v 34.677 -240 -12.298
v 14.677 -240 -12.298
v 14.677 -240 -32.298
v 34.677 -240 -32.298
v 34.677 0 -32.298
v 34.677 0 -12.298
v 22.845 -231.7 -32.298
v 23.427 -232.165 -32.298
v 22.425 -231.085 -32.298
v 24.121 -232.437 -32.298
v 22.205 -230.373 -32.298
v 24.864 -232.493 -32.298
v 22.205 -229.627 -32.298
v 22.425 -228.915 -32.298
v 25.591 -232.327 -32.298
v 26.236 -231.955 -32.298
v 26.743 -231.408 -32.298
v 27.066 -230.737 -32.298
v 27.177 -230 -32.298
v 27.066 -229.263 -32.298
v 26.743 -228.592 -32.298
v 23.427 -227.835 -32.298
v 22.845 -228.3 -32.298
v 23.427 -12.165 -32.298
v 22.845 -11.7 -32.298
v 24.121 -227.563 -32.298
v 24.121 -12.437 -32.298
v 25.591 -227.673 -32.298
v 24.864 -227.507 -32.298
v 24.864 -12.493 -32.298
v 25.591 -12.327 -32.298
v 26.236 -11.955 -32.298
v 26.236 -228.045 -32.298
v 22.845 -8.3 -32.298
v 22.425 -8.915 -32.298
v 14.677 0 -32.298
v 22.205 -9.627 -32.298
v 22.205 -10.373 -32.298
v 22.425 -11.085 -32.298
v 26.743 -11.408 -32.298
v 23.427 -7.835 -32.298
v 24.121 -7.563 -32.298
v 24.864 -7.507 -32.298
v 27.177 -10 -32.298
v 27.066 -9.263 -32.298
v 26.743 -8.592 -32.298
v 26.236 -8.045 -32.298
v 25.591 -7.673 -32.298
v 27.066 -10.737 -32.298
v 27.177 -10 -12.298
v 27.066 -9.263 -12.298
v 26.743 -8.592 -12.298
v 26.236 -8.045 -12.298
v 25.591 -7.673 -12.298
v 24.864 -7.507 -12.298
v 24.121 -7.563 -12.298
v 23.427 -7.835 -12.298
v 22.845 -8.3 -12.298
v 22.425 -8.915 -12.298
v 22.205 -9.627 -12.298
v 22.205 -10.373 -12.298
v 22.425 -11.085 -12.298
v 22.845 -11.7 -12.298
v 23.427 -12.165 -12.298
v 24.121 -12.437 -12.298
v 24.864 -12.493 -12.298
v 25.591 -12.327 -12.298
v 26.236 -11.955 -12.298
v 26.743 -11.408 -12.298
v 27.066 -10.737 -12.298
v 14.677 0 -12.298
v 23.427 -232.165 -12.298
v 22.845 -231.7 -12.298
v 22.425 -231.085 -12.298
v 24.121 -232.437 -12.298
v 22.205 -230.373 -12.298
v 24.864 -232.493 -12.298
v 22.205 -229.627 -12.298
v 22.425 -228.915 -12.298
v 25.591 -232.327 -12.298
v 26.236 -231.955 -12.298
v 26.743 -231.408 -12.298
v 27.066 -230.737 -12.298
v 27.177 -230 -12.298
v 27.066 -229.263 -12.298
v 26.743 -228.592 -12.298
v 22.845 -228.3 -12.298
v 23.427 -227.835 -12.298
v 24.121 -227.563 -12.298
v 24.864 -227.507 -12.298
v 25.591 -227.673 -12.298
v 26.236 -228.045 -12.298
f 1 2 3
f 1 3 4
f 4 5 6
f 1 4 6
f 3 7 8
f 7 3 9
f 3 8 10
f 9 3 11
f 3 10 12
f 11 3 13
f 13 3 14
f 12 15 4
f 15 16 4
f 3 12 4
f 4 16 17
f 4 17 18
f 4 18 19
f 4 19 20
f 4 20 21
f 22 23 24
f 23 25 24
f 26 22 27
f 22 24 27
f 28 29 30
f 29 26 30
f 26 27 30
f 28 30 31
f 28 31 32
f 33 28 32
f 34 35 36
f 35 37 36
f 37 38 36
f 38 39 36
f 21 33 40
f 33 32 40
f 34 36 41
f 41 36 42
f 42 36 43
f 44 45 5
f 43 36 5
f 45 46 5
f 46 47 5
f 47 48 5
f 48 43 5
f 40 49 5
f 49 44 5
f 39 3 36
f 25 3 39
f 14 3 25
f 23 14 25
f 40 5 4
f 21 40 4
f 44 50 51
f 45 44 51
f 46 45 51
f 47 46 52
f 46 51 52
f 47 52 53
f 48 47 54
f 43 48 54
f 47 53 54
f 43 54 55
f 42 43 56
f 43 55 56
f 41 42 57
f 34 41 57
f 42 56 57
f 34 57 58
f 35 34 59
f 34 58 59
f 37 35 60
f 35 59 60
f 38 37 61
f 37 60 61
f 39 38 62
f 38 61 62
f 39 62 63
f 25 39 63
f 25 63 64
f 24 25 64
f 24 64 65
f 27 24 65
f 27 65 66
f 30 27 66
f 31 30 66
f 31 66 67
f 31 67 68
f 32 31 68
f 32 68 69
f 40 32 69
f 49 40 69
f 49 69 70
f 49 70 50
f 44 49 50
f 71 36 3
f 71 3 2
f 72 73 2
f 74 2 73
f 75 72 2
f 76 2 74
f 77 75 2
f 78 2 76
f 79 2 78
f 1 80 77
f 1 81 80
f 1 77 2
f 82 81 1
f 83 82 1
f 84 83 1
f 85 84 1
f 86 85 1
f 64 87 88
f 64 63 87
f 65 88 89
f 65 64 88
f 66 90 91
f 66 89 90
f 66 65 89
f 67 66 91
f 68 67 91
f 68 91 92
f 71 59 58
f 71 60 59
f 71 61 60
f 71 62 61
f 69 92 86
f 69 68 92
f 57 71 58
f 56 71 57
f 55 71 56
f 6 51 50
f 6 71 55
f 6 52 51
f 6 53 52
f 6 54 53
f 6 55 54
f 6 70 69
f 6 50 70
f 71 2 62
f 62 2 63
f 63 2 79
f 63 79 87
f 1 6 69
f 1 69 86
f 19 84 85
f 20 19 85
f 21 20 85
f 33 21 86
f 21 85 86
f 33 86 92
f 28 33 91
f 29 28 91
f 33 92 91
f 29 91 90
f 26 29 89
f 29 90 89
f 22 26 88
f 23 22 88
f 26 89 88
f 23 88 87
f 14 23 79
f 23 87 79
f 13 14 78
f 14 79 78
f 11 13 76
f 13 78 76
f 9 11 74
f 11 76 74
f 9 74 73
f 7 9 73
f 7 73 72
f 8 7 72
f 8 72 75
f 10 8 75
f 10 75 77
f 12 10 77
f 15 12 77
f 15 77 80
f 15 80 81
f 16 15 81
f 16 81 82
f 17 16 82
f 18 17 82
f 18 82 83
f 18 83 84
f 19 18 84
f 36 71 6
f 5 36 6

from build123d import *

# Parameters (mm, degrees)
F0_W     = 20
F0_H     = 20
F1_DEPTH = 240
F2_R     = 2.5
F3_DEPTH = 25
F4_R     = 2.5
F5_DEPTH = 25


with BuildPart() as f1:
    # F0 (on Front) → F1 (new body)
    with BuildSketch(Plane.XZ):
        with Locations((24.677172, -22.298429)):
            Rectangle(F0_W, F0_H)
    extrude(amount=F1_DEPTH)

    # F2 (on face) → F3 (cut)
    with BuildSketch(Plane.XY.offset(-12.298429)):
        with Locations((24.677172, -230)):
            Circle(F2_R)
    extrude(amount=-F3_DEPTH, mode=Mode.SUBTRACT)

    # F4 (on face) → F5 (cut)
    with BuildSketch(Plane.XY.offset(-12.298429)):
        with Locations((24.677172, -10)):
            Circle(F4_R)
    extrude(amount=-F5_DEPTH, mode=Mode.SUBTRACT)


solid = f1.part
